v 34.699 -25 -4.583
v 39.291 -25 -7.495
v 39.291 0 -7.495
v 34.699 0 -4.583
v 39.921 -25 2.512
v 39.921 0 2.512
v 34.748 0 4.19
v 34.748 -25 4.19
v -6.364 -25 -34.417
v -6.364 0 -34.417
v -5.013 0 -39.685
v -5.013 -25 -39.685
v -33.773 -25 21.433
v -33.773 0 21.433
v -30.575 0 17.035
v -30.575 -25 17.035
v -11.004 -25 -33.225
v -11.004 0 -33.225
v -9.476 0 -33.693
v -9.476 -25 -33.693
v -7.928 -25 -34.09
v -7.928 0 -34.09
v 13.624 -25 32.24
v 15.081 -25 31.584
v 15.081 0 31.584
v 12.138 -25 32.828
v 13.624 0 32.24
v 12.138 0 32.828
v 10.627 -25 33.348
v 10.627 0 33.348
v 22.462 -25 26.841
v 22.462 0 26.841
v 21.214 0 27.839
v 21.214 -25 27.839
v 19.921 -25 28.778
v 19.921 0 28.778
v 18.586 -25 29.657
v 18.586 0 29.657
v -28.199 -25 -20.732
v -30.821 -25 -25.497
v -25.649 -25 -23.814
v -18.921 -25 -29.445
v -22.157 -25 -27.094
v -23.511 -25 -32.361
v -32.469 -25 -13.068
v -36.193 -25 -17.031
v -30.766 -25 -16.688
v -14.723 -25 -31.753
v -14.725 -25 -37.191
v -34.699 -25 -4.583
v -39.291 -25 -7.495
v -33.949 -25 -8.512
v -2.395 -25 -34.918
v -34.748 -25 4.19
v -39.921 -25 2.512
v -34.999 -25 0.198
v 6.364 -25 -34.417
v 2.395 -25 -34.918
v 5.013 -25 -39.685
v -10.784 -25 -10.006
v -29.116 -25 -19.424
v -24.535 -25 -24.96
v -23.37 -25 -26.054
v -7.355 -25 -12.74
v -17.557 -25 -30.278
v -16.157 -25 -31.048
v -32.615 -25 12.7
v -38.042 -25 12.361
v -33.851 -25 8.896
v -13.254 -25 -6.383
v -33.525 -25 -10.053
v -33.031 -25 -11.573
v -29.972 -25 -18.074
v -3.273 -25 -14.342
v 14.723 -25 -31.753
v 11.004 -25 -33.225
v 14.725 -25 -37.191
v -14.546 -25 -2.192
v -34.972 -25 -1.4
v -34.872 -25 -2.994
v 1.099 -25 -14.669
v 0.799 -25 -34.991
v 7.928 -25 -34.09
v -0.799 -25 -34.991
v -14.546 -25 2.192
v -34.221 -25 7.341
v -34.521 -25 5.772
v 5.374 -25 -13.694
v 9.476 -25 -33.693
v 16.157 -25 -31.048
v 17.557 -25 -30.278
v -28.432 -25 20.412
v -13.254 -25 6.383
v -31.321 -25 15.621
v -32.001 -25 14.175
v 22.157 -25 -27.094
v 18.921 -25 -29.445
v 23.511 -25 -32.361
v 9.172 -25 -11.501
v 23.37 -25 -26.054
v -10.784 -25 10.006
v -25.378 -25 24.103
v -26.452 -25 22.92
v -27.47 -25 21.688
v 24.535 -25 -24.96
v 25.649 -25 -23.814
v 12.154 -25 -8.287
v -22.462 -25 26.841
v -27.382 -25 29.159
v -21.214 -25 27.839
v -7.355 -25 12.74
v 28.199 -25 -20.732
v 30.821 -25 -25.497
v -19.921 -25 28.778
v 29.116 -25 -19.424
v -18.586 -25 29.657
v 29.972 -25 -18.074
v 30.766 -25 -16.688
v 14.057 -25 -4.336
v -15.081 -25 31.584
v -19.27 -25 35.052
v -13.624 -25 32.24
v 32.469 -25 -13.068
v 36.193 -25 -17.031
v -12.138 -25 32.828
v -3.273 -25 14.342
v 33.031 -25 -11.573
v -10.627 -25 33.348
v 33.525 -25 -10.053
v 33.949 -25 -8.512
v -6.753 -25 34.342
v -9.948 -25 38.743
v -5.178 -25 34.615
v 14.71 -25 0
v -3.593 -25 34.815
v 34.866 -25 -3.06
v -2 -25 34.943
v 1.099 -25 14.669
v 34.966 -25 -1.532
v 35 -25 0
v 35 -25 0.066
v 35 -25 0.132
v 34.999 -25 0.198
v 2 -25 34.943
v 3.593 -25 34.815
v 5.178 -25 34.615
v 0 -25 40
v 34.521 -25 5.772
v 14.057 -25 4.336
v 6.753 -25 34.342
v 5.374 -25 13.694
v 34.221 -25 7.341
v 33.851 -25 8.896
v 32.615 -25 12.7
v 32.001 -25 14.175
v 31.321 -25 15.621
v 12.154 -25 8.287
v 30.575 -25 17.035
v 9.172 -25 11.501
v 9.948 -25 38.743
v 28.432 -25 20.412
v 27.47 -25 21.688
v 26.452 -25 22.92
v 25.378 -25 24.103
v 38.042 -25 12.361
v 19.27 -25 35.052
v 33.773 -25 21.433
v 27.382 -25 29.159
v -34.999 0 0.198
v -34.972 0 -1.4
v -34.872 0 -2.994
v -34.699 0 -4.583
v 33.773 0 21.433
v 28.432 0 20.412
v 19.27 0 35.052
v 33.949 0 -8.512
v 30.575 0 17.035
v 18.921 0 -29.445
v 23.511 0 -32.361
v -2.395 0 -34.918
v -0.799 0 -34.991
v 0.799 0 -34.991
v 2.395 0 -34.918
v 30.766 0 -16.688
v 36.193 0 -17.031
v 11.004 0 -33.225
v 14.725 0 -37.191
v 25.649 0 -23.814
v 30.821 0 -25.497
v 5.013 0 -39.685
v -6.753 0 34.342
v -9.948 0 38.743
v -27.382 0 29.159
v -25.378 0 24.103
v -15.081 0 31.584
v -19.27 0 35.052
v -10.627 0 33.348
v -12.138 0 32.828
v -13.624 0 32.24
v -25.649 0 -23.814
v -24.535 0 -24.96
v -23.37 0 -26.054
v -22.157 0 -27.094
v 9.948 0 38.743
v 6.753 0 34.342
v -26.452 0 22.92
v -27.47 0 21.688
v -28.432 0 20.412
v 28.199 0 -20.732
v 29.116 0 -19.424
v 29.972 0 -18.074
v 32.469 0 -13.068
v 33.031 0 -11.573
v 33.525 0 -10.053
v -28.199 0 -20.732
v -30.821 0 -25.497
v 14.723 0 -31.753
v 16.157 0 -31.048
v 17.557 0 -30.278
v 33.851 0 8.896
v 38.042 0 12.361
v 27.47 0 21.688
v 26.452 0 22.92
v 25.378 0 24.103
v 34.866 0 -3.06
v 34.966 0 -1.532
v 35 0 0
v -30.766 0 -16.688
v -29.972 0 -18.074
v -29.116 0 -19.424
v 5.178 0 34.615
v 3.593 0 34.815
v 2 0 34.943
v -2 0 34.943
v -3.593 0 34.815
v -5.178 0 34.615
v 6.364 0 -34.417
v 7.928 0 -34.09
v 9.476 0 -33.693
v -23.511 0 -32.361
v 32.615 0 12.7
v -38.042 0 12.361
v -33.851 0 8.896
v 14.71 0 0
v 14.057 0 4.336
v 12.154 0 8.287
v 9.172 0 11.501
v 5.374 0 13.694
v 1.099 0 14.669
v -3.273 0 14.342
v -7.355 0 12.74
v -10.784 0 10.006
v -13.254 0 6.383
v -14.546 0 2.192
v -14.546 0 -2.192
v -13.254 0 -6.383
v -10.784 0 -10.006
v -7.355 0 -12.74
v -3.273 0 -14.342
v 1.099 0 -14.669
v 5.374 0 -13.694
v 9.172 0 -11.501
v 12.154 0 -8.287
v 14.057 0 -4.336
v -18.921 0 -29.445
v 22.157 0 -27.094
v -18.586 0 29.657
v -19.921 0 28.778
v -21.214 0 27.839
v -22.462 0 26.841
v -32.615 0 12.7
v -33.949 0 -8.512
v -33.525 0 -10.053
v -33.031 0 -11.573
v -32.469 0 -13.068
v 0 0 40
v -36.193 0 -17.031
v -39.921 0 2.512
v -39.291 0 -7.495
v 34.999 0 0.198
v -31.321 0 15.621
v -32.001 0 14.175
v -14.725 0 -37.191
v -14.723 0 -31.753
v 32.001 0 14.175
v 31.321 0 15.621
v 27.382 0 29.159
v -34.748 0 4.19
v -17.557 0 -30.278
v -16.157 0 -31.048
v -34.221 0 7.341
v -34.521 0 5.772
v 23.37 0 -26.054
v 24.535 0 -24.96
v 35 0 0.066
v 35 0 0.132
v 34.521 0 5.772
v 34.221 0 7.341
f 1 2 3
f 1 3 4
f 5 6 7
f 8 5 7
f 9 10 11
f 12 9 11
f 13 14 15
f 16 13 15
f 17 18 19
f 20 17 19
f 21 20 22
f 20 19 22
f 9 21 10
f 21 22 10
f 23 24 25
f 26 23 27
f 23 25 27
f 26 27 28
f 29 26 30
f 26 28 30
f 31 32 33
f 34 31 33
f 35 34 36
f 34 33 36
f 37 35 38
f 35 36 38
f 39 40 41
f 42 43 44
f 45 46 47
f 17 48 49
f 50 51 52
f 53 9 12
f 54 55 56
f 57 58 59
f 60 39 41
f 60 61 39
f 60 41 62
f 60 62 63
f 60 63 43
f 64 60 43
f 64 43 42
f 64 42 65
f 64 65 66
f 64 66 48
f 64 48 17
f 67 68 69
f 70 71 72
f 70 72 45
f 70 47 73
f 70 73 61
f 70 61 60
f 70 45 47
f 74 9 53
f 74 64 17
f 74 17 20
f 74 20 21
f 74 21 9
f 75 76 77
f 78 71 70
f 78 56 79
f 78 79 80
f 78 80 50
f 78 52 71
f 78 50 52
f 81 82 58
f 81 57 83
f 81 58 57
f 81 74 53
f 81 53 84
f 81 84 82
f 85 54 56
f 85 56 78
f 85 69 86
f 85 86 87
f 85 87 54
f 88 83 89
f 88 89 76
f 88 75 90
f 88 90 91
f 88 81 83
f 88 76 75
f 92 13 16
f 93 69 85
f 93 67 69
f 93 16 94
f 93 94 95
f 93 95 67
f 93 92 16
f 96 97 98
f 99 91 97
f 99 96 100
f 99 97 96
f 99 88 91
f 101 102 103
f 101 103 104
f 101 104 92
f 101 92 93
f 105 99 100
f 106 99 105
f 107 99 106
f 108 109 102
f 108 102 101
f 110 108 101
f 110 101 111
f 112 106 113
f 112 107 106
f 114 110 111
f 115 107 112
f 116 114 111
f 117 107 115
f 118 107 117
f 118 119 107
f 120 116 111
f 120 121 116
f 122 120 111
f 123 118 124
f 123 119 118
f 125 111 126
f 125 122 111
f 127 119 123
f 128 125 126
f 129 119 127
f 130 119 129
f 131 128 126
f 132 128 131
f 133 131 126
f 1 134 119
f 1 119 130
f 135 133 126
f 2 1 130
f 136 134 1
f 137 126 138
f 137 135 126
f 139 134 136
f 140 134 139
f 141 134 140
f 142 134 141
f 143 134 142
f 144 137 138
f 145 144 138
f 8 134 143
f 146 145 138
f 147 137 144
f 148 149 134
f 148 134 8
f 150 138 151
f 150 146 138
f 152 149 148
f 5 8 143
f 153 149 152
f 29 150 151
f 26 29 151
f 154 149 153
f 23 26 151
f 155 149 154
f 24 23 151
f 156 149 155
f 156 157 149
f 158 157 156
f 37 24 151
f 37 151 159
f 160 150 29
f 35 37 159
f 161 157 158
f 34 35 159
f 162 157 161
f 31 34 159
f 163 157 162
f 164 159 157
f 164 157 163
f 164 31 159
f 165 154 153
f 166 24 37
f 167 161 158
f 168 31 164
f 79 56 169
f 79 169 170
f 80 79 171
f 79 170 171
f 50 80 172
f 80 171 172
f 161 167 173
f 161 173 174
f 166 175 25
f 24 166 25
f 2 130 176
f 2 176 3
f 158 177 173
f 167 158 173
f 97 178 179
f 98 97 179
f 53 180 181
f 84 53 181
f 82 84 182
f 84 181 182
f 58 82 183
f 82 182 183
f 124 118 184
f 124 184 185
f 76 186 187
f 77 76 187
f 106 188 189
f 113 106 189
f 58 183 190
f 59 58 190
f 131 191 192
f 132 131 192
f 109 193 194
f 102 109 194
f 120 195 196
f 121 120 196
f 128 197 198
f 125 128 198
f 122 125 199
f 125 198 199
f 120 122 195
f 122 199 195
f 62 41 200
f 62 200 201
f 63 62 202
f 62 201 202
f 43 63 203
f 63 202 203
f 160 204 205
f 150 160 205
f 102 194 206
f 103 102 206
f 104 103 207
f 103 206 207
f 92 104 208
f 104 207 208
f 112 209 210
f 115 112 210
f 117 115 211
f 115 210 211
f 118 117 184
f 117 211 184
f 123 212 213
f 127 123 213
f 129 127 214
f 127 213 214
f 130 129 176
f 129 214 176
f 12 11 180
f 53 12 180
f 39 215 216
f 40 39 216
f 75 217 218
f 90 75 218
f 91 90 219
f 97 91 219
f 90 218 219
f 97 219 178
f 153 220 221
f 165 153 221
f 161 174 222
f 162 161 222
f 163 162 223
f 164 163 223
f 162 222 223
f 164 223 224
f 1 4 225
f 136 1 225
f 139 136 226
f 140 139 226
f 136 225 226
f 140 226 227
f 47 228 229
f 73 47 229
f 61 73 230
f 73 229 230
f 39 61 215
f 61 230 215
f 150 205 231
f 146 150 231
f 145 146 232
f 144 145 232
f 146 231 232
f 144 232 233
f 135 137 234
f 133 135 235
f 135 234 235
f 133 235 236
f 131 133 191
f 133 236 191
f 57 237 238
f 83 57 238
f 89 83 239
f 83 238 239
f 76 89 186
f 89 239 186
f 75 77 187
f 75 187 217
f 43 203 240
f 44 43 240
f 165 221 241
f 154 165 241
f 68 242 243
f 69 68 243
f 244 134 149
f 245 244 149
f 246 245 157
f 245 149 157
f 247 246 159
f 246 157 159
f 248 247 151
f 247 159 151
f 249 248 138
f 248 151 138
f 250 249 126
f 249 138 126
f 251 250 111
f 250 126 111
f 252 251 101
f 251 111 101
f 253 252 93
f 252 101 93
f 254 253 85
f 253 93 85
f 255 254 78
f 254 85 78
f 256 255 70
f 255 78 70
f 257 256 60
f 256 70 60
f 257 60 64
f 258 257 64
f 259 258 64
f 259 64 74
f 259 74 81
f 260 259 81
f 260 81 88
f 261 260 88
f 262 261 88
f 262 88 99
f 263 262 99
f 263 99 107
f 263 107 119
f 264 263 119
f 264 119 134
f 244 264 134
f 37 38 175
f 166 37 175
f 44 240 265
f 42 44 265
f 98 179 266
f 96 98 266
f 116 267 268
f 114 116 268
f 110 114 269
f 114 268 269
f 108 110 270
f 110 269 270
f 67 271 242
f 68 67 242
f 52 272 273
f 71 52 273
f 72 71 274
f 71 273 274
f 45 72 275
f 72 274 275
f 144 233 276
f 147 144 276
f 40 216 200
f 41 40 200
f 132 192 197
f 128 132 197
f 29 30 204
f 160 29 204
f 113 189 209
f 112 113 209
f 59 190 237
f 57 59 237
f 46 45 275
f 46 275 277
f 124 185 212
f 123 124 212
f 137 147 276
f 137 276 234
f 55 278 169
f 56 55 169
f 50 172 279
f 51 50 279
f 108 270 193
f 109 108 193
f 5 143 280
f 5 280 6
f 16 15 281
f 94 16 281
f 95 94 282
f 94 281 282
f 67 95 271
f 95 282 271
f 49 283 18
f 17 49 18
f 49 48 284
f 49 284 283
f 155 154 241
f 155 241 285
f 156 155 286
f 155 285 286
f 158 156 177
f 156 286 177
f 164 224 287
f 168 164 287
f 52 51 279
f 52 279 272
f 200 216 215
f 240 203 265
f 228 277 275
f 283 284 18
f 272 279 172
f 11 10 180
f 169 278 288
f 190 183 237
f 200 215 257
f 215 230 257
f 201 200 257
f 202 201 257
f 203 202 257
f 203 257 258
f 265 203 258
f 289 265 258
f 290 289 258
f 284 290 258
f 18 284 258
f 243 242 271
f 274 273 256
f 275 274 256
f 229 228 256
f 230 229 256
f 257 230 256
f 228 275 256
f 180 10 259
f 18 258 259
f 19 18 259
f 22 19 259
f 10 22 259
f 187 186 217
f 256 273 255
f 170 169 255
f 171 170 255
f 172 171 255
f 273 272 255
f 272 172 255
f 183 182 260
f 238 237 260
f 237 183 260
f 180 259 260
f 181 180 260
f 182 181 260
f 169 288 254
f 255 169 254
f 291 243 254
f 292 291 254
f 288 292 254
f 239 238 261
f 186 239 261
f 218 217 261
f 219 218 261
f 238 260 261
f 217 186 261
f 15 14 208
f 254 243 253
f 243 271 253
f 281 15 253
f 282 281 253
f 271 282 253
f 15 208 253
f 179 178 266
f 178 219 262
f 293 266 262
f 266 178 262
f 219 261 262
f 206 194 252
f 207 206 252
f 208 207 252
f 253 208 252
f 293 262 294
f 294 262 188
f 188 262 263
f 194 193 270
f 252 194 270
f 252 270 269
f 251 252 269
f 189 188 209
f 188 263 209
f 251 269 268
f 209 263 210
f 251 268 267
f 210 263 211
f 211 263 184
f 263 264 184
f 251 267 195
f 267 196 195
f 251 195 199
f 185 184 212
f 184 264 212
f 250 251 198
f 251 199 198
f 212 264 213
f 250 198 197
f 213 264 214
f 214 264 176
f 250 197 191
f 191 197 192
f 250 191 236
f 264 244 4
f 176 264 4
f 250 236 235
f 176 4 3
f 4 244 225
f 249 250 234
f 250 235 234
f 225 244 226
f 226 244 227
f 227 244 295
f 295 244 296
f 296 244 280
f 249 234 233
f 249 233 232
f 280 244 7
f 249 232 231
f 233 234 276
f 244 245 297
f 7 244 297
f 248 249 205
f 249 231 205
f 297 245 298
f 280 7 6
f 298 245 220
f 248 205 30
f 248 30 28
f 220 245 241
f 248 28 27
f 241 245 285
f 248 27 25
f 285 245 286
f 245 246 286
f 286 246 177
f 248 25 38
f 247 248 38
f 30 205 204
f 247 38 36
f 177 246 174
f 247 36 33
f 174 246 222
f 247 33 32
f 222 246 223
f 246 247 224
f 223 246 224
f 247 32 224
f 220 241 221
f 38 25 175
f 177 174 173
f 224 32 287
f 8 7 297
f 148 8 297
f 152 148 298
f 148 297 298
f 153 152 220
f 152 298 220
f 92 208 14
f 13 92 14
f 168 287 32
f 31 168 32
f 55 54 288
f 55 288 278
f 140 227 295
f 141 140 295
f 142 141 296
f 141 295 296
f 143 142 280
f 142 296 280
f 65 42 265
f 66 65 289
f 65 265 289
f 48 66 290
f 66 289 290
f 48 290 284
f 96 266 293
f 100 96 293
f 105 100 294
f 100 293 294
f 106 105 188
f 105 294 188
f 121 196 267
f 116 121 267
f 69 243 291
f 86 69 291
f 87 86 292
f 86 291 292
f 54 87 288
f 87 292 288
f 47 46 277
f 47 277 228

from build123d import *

# Parameters (mm, degrees)
F1_DEPTH = 25
F2_R     = 14.710465
F3_DEPTH = 123


with BuildPart() as f1:
    # F0 (on Front) → F1 (new body)
    with BuildSketch(Plane.XZ):
        with BuildLine():
            ThreePointArc((34.69864, -4.583055), (34.924579, -2.296476), (35, 0))
            ThreePointArc((35, 0), (34.99986, 0.099012), (34.99944, 0.198024))
            ThreePointArc((34.99944, 0.198024), (34.930935, 2.197668), (34.748278, 4.190131))
            ThreePointArc((34.748278, 4.190131), (34.380054, 6.558346), (33.850622, 8.895809))
            ThreePointArc((33.850622, 8.895809), (33.286978, 10.815595), (32.614554, 12.700035))
            ThreePointArc((32.614554, 12.700035), (31.668947, 14.902275), (30.574844, 17.034638))
            ThreePointArc((30.574844, 17.034638), (29.551477, 18.753938), (28.431537, 20.41195))
            ThreePointArc((28.431537, 20.41195), (26.967963, 22.30984), (25.377937, 24.103118))
            ThreePointArc((25.377937, 24.103118), (23.959149, 25.513902), (22.462062, 26.841307))
            ThreePointArc((22.462062, 26.841307), (20.572484, 28.315595), (18.586441, 29.657111))
            ThreePointArc((18.586441, 29.657111), (16.861379, 30.670734), (15.081214, 31.584126))
            ThreePointArc((15.081214, 31.584126), (12.884359, 32.542177), (10.62709, 33.347638))
            ThreePointArc((10.62709, 33.347638), (8.704146, 33.900411), (6.752757, 34.342398))
            ThreePointArc((6.752757, 34.342398), (4.386663, 34.724015), (2, 34.94281))
            ThreePointArc((2, 34.94281), (0, 35), (-2, 34.94281))
            ThreePointArc((-2, 34.94281), (-4.386663, 34.724015), (-6.752757, 34.342398))
            ThreePointArc((-6.752757, 34.342398), (-8.704146, 33.900411), (-10.62709, 33.347638))
            ThreePointArc((-10.62709, 33.347638), (-12.884359, 32.542177), (-15.081214, 31.584126))
            ThreePointArc((-15.081214, 31.584126), (-16.861379, 30.670734), (-18.586441, 29.657111))
            ThreePointArc((-18.586441, 29.657111), (-20.572484, 28.315595), (-22.462062, 26.841307))
            ThreePointArc((-22.462062, 26.841307), (-23.959149, 25.513902), (-25.377937, 24.103118))
            ThreePointArc((-25.377937, 24.103118), (-26.967963, 22.30984), (-28.431537, 20.41195))
            ThreePointArc((-28.431537, 20.41195), (-29.551477, 18.753938), (-30.574844, 17.034638))
            ThreePointArc((-30.574844, 17.034638), (-31.668947, 14.902275), (-32.614554, 12.700035))
            ThreePointArc((-32.614554, 12.700035), (-33.286978, 10.815595), (-33.850622, 8.895809))
            ThreePointArc((-33.850622, 8.895809), (-34.380054, 6.558346), (-34.748278, 4.190131))
            ThreePointArc((-34.748278, 4.190131), (-34.930935, 2.197668), (-34.99944, 0.198024))
            ThreePointArc((-34.99944, 0.198024), (-34.930935, -2.197668), (-34.69864, -4.583055))
            ThreePointArc((-34.69864, -4.583055), (-34.380054, -6.558346), (-33.949115, -8.512204))
            ThreePointArc((-33.949115, -8.512204), (-33.286978, -10.815595), (-32.468759, -13.068271))
            ThreePointArc((-32.468759, -13.068271), (-31.668947, -14.902275), (-30.765642, -16.687579))
            ThreePointArc((-30.765642, -16.687579), (-29.551477, -18.753938), (-28.198746, -20.732359))
            ThreePointArc((-28.198746, -20.732359), (-26.967963, -22.30984), (-25.64905, -23.814412))
            ThreePointArc((-25.64905, -23.814412), (-23.959149, -25.513902), (-22.156903, -27.093757))
            ThreePointArc((-22.156903, -27.093757), (-20.572484, -28.315595), (-18.920835, -29.444898))
            ThreePointArc((-18.920835, -29.444898), (-16.861379, -30.670734), (-14.722859, -31.752754))
            ThreePointArc((-14.722859, -31.752754), (-12.884359, -32.542177), (-11.003753, -33.225253))
            ThreePointArc((-11.003753, -33.225253), (-8.704146, -33.900411), (-6.363725, -34.416609))
            ThreePointArc((-6.363725, -34.416609), (-4.386663, -34.724015), (-2.395266, -34.917942))
            ThreePointArc((-2.395266, -34.917942), (0, -35), (2.395266, -34.917942))
            ThreePointArc((2.395266, -34.917942), (4.386663, -34.724015), (6.363725, -34.416609))
            ThreePointArc((6.363725, -34.416609), (8.704146, -33.900411), (11.003753, -33.225253))
            ThreePointArc((11.003753, -33.225253), (12.884359, -32.542177), (14.722859, -31.752754))
            ThreePointArc((14.722859, -31.752754), (16.861379, -30.670734), (18.920835, -29.444898))
            ThreePointArc((18.920835, -29.444898), (20.572484, -28.315595), (22.156903, -27.093757))
            ThreePointArc((22.156903, -27.093757), (23.959149, -25.513902), (25.64905, -23.814412))
            ThreePointArc((25.64905, -23.814412), (26.967963, -22.30984), (28.198746, -20.732359))
            ThreePointArc((28.198746, -20.732359), (29.551477, -18.753938), (30.765642, -16.687579))
            ThreePointArc((30.765642, -16.687579), (31.668947, -14.902275), (32.468759, -13.068271))
            ThreePointArc((32.468759, -13.068271), (33.286978, -10.815595), (33.949115, -8.512204))
            ThreePointArc((33.949115, -8.512204), (34.380054, -6.558346), (34.69864, -4.583055))
        make_face()
        with BuildLine():
            ThreePointArc((34.748278, 4.190131), (34.930935, 2.197668), (34.99944, 0.198024))
            Line((34.99944, 0.198024), (39.921069, 2.511621))
            Line((39.921069, 2.511621), (34.748278, 4.190131))
        make_face()
        with BuildLine():
            Line((39.29149, -7.495253), (34.69864, -4.583055))
            ThreePointArc((34.69864, -4.583055), (34.380054, -6.558346), (33.949115, -8.512204))
            Line((33.949115, -8.512204), (39.29149, -7.495253))
        make_face()
        with BuildLine():
            ThreePointArc((32.614554, 12.700035), (33.286978, 10.815595), (33.850622, 8.895809))
            Line((33.850622, 8.895809), (38.042261, 12.36068))
            Line((38.042261, 12.36068), (32.614554, 12.700035))
        make_face()
        with BuildLine():
            Line((36.193082, -17.031172), (32.468759, -13.068271))
            ThreePointArc((32.468759, -13.068271), (31.668947, -14.902275), (30.765642, -16.687579))
            Line((30.765642, -16.687579), (36.193082, -17.031172))
        make_face()
        with BuildLine():
            ThreePointArc((28.431537, 20.41195), (29.551477, 18.753938), (30.574844, 17.034638))
            Line((30.574844, 17.034638), (33.773117, 21.433072))
            Line((33.773117, 21.433072), (28.431537, 20.41195))
        make_face()
        with BuildLine():
            Line((30.82053, -25.49696), (28.198746, -20.732359))
            ThreePointArc((28.198746, -20.732359), (26.967963, -22.30984), (25.64905, -23.814412))
            Line((25.64905, -23.814412), (30.82053, -25.49696))
        make_face()
        with BuildLine():
            ThreePointArc((22.462062, 26.841307), (23.959149, 25.513902), (25.377937, 24.103118))
            Line((25.377937, 24.103118), (27.381884, 29.158745))
            Line((27.381884, 29.158745), (22.462062, 26.841307))
        make_face()
        with BuildLine():
            Line((23.51141, -32.36068), (22.156903, -27.093757))
            ThreePointArc((22.156903, -27.093757), (20.572484, -28.315595), (18.920835, -29.444898))
            Line((18.920835, -29.444898), (23.51141, -32.36068))
        make_face()
        with BuildLine():
            ThreePointArc((15.081214, 31.584126), (16.861379, 30.670734), (18.586441, 29.657111))
            Line((18.586441, 29.657111), (19.270147, 35.052267))
            Line((19.270147, 35.052267), (15.081214, 31.584126))
        make_face()
        with BuildLine():
            Line((14.724982, -37.191059), (14.722859, -31.752754))
            ThreePointArc((14.722859, -31.752754), (12.884359, -32.542177), (11.003753, -33.225253))
            Line((11.003753, -33.225253), (14.724982, -37.191059))
        make_face()
        with BuildLine():
            ThreePointArc((6.752757, 34.342398), (8.704146, 33.900411), (10.62709, 33.347638))
            Line((10.62709, 33.347638), (9.947595, 38.743326))
            Line((9.947595, 38.743326), (6.752757, 34.342398))
        make_face()
        with BuildLine():
            Line((5.013329, -39.684588), (6.363725, -34.416609))
            ThreePointArc((6.363725, -34.416609), (4.386663, -34.724015), (2.395266, -34.917942))
            Line((2.395266, -34.917942), (5.013329, -39.684588))
        make_face()
        with BuildLine():
            ThreePointArc((-2, 34.94281), (0, 35), (2, 34.94281))
            Line((2, 34.94281), (0, 40))
            Line((0, 40), (-2, 34.94281))
        make_face()
        with BuildLine():
            Line((-5.013329, -39.684588), (-2.395266, -34.917942))
            ThreePointArc((-2.395266, -34.917942), (-4.386663, -34.724015), (-6.363725, -34.416609))
            Line((-6.363725, -34.416609), (-5.013329, -39.684588))
        make_face()
        with BuildLine():
            ThreePointArc((-10.62709, 33.347638), (-8.704146, 33.900411), (-6.752757, 34.342398))
            Line((-6.752757, 34.342398), (-9.947595, 38.743326))
            Line((-9.947595, 38.743326), (-10.62709, 33.347638))
        make_face()
        with BuildLine():
            Line((-14.724982, -37.191059), (-11.003753, -33.225253))
            ThreePointArc((-11.003753, -33.225253), (-12.884359, -32.542177), (-14.722859, -31.752754))
            Line((-14.722859, -31.752754), (-14.724982, -37.191059))
        make_face()
        with BuildLine():
            ThreePointArc((-18.586441, 29.657111), (-16.861379, 30.670734), (-15.081214, 31.584126))
            Line((-15.081214, 31.584126), (-19.270147, 35.052267))
            Line((-19.270147, 35.052267), (-18.586441, 29.657111))
        make_face()
        with BuildLine():
            Line((-23.51141, -32.36068), (-18.920835, -29.444898))
            ThreePointArc((-18.920835, -29.444898), (-20.572484, -28.315595), (-22.156903, -27.093757))
            Line((-22.156903, -27.093757), (-23.51141, -32.36068))
        make_face()
        with BuildLine():
            ThreePointArc((-25.377937, 24.103118), (-23.959149, 25.513902), (-22.462062, 26.841307))
            Line((-22.462062, 26.841307), (-27.381884, 29.158745))
            Line((-27.381884, 29.158745), (-25.377937, 24.103118))
        make_face()
        with BuildLine():
            Line((-30.82053, -25.49696), (-25.64905, -23.814412))
            ThreePointArc((-25.64905, -23.814412), (-26.967963, -22.30984), (-28.198746, -20.732359))
            Line((-28.198746, -20.732359), (-30.82053, -25.49696))
        make_face()
        with BuildLine():
            ThreePointArc((-30.574844, 17.034638), (-29.551477, 18.753938), (-28.431537, 20.41195))
            Line((-28.431537, 20.41195), (-33.773117, 21.433072))
            Line((-33.773117, 21.433072), (-30.574844, 17.034638))
        make_face()
        with BuildLine():
            Line((-36.193082, -17.031172), (-30.765642, -16.687579))
            ThreePointArc((-30.765642, -16.687579), (-31.668947, -14.902275), (-32.468759, -13.068271))
            Line((-32.468759, -13.068271), (-36.193082, -17.031172))
        make_face()
        with BuildLine():
            ThreePointArc((-33.850622, 8.895809), (-33.286978, 10.815595), (-32.614554, 12.700035))
            Line((-32.614554, 12.700035), (-38.042261, 12.36068))
            Line((-38.042261, 12.36068), (-33.850622, 8.895809))
        make_face()
        with BuildLine():
            Line((-39.29149, -7.495253), (-33.949115, -8.512204))
            ThreePointArc((-33.949115, -8.512204), (-34.380054, -6.558346), (-34.69864, -4.583055))
            Line((-34.69864, -4.583055), (-39.29149, -7.495253))
        make_face()
        with BuildLine():
            ThreePointArc((-34.99944, 0.198024), (-34.930935, 2.197668), (-34.748278, 4.190131))
            Line((-34.748278, 4.190131), (-39.921069, 2.511621))
            Line((-39.921069, 2.511621), (-34.99944, 0.198024))
        make_face()
    extrude(amount=F1_DEPTH)

    # F2 (on face) → F3 (cut)
    with BuildSketch(Plane.XZ.offset(25)):
        Circle(F2_R)
    extrude(amount=-F3_DEPTH, mode=Mode.SUBTRACT)


solid = f1.part
